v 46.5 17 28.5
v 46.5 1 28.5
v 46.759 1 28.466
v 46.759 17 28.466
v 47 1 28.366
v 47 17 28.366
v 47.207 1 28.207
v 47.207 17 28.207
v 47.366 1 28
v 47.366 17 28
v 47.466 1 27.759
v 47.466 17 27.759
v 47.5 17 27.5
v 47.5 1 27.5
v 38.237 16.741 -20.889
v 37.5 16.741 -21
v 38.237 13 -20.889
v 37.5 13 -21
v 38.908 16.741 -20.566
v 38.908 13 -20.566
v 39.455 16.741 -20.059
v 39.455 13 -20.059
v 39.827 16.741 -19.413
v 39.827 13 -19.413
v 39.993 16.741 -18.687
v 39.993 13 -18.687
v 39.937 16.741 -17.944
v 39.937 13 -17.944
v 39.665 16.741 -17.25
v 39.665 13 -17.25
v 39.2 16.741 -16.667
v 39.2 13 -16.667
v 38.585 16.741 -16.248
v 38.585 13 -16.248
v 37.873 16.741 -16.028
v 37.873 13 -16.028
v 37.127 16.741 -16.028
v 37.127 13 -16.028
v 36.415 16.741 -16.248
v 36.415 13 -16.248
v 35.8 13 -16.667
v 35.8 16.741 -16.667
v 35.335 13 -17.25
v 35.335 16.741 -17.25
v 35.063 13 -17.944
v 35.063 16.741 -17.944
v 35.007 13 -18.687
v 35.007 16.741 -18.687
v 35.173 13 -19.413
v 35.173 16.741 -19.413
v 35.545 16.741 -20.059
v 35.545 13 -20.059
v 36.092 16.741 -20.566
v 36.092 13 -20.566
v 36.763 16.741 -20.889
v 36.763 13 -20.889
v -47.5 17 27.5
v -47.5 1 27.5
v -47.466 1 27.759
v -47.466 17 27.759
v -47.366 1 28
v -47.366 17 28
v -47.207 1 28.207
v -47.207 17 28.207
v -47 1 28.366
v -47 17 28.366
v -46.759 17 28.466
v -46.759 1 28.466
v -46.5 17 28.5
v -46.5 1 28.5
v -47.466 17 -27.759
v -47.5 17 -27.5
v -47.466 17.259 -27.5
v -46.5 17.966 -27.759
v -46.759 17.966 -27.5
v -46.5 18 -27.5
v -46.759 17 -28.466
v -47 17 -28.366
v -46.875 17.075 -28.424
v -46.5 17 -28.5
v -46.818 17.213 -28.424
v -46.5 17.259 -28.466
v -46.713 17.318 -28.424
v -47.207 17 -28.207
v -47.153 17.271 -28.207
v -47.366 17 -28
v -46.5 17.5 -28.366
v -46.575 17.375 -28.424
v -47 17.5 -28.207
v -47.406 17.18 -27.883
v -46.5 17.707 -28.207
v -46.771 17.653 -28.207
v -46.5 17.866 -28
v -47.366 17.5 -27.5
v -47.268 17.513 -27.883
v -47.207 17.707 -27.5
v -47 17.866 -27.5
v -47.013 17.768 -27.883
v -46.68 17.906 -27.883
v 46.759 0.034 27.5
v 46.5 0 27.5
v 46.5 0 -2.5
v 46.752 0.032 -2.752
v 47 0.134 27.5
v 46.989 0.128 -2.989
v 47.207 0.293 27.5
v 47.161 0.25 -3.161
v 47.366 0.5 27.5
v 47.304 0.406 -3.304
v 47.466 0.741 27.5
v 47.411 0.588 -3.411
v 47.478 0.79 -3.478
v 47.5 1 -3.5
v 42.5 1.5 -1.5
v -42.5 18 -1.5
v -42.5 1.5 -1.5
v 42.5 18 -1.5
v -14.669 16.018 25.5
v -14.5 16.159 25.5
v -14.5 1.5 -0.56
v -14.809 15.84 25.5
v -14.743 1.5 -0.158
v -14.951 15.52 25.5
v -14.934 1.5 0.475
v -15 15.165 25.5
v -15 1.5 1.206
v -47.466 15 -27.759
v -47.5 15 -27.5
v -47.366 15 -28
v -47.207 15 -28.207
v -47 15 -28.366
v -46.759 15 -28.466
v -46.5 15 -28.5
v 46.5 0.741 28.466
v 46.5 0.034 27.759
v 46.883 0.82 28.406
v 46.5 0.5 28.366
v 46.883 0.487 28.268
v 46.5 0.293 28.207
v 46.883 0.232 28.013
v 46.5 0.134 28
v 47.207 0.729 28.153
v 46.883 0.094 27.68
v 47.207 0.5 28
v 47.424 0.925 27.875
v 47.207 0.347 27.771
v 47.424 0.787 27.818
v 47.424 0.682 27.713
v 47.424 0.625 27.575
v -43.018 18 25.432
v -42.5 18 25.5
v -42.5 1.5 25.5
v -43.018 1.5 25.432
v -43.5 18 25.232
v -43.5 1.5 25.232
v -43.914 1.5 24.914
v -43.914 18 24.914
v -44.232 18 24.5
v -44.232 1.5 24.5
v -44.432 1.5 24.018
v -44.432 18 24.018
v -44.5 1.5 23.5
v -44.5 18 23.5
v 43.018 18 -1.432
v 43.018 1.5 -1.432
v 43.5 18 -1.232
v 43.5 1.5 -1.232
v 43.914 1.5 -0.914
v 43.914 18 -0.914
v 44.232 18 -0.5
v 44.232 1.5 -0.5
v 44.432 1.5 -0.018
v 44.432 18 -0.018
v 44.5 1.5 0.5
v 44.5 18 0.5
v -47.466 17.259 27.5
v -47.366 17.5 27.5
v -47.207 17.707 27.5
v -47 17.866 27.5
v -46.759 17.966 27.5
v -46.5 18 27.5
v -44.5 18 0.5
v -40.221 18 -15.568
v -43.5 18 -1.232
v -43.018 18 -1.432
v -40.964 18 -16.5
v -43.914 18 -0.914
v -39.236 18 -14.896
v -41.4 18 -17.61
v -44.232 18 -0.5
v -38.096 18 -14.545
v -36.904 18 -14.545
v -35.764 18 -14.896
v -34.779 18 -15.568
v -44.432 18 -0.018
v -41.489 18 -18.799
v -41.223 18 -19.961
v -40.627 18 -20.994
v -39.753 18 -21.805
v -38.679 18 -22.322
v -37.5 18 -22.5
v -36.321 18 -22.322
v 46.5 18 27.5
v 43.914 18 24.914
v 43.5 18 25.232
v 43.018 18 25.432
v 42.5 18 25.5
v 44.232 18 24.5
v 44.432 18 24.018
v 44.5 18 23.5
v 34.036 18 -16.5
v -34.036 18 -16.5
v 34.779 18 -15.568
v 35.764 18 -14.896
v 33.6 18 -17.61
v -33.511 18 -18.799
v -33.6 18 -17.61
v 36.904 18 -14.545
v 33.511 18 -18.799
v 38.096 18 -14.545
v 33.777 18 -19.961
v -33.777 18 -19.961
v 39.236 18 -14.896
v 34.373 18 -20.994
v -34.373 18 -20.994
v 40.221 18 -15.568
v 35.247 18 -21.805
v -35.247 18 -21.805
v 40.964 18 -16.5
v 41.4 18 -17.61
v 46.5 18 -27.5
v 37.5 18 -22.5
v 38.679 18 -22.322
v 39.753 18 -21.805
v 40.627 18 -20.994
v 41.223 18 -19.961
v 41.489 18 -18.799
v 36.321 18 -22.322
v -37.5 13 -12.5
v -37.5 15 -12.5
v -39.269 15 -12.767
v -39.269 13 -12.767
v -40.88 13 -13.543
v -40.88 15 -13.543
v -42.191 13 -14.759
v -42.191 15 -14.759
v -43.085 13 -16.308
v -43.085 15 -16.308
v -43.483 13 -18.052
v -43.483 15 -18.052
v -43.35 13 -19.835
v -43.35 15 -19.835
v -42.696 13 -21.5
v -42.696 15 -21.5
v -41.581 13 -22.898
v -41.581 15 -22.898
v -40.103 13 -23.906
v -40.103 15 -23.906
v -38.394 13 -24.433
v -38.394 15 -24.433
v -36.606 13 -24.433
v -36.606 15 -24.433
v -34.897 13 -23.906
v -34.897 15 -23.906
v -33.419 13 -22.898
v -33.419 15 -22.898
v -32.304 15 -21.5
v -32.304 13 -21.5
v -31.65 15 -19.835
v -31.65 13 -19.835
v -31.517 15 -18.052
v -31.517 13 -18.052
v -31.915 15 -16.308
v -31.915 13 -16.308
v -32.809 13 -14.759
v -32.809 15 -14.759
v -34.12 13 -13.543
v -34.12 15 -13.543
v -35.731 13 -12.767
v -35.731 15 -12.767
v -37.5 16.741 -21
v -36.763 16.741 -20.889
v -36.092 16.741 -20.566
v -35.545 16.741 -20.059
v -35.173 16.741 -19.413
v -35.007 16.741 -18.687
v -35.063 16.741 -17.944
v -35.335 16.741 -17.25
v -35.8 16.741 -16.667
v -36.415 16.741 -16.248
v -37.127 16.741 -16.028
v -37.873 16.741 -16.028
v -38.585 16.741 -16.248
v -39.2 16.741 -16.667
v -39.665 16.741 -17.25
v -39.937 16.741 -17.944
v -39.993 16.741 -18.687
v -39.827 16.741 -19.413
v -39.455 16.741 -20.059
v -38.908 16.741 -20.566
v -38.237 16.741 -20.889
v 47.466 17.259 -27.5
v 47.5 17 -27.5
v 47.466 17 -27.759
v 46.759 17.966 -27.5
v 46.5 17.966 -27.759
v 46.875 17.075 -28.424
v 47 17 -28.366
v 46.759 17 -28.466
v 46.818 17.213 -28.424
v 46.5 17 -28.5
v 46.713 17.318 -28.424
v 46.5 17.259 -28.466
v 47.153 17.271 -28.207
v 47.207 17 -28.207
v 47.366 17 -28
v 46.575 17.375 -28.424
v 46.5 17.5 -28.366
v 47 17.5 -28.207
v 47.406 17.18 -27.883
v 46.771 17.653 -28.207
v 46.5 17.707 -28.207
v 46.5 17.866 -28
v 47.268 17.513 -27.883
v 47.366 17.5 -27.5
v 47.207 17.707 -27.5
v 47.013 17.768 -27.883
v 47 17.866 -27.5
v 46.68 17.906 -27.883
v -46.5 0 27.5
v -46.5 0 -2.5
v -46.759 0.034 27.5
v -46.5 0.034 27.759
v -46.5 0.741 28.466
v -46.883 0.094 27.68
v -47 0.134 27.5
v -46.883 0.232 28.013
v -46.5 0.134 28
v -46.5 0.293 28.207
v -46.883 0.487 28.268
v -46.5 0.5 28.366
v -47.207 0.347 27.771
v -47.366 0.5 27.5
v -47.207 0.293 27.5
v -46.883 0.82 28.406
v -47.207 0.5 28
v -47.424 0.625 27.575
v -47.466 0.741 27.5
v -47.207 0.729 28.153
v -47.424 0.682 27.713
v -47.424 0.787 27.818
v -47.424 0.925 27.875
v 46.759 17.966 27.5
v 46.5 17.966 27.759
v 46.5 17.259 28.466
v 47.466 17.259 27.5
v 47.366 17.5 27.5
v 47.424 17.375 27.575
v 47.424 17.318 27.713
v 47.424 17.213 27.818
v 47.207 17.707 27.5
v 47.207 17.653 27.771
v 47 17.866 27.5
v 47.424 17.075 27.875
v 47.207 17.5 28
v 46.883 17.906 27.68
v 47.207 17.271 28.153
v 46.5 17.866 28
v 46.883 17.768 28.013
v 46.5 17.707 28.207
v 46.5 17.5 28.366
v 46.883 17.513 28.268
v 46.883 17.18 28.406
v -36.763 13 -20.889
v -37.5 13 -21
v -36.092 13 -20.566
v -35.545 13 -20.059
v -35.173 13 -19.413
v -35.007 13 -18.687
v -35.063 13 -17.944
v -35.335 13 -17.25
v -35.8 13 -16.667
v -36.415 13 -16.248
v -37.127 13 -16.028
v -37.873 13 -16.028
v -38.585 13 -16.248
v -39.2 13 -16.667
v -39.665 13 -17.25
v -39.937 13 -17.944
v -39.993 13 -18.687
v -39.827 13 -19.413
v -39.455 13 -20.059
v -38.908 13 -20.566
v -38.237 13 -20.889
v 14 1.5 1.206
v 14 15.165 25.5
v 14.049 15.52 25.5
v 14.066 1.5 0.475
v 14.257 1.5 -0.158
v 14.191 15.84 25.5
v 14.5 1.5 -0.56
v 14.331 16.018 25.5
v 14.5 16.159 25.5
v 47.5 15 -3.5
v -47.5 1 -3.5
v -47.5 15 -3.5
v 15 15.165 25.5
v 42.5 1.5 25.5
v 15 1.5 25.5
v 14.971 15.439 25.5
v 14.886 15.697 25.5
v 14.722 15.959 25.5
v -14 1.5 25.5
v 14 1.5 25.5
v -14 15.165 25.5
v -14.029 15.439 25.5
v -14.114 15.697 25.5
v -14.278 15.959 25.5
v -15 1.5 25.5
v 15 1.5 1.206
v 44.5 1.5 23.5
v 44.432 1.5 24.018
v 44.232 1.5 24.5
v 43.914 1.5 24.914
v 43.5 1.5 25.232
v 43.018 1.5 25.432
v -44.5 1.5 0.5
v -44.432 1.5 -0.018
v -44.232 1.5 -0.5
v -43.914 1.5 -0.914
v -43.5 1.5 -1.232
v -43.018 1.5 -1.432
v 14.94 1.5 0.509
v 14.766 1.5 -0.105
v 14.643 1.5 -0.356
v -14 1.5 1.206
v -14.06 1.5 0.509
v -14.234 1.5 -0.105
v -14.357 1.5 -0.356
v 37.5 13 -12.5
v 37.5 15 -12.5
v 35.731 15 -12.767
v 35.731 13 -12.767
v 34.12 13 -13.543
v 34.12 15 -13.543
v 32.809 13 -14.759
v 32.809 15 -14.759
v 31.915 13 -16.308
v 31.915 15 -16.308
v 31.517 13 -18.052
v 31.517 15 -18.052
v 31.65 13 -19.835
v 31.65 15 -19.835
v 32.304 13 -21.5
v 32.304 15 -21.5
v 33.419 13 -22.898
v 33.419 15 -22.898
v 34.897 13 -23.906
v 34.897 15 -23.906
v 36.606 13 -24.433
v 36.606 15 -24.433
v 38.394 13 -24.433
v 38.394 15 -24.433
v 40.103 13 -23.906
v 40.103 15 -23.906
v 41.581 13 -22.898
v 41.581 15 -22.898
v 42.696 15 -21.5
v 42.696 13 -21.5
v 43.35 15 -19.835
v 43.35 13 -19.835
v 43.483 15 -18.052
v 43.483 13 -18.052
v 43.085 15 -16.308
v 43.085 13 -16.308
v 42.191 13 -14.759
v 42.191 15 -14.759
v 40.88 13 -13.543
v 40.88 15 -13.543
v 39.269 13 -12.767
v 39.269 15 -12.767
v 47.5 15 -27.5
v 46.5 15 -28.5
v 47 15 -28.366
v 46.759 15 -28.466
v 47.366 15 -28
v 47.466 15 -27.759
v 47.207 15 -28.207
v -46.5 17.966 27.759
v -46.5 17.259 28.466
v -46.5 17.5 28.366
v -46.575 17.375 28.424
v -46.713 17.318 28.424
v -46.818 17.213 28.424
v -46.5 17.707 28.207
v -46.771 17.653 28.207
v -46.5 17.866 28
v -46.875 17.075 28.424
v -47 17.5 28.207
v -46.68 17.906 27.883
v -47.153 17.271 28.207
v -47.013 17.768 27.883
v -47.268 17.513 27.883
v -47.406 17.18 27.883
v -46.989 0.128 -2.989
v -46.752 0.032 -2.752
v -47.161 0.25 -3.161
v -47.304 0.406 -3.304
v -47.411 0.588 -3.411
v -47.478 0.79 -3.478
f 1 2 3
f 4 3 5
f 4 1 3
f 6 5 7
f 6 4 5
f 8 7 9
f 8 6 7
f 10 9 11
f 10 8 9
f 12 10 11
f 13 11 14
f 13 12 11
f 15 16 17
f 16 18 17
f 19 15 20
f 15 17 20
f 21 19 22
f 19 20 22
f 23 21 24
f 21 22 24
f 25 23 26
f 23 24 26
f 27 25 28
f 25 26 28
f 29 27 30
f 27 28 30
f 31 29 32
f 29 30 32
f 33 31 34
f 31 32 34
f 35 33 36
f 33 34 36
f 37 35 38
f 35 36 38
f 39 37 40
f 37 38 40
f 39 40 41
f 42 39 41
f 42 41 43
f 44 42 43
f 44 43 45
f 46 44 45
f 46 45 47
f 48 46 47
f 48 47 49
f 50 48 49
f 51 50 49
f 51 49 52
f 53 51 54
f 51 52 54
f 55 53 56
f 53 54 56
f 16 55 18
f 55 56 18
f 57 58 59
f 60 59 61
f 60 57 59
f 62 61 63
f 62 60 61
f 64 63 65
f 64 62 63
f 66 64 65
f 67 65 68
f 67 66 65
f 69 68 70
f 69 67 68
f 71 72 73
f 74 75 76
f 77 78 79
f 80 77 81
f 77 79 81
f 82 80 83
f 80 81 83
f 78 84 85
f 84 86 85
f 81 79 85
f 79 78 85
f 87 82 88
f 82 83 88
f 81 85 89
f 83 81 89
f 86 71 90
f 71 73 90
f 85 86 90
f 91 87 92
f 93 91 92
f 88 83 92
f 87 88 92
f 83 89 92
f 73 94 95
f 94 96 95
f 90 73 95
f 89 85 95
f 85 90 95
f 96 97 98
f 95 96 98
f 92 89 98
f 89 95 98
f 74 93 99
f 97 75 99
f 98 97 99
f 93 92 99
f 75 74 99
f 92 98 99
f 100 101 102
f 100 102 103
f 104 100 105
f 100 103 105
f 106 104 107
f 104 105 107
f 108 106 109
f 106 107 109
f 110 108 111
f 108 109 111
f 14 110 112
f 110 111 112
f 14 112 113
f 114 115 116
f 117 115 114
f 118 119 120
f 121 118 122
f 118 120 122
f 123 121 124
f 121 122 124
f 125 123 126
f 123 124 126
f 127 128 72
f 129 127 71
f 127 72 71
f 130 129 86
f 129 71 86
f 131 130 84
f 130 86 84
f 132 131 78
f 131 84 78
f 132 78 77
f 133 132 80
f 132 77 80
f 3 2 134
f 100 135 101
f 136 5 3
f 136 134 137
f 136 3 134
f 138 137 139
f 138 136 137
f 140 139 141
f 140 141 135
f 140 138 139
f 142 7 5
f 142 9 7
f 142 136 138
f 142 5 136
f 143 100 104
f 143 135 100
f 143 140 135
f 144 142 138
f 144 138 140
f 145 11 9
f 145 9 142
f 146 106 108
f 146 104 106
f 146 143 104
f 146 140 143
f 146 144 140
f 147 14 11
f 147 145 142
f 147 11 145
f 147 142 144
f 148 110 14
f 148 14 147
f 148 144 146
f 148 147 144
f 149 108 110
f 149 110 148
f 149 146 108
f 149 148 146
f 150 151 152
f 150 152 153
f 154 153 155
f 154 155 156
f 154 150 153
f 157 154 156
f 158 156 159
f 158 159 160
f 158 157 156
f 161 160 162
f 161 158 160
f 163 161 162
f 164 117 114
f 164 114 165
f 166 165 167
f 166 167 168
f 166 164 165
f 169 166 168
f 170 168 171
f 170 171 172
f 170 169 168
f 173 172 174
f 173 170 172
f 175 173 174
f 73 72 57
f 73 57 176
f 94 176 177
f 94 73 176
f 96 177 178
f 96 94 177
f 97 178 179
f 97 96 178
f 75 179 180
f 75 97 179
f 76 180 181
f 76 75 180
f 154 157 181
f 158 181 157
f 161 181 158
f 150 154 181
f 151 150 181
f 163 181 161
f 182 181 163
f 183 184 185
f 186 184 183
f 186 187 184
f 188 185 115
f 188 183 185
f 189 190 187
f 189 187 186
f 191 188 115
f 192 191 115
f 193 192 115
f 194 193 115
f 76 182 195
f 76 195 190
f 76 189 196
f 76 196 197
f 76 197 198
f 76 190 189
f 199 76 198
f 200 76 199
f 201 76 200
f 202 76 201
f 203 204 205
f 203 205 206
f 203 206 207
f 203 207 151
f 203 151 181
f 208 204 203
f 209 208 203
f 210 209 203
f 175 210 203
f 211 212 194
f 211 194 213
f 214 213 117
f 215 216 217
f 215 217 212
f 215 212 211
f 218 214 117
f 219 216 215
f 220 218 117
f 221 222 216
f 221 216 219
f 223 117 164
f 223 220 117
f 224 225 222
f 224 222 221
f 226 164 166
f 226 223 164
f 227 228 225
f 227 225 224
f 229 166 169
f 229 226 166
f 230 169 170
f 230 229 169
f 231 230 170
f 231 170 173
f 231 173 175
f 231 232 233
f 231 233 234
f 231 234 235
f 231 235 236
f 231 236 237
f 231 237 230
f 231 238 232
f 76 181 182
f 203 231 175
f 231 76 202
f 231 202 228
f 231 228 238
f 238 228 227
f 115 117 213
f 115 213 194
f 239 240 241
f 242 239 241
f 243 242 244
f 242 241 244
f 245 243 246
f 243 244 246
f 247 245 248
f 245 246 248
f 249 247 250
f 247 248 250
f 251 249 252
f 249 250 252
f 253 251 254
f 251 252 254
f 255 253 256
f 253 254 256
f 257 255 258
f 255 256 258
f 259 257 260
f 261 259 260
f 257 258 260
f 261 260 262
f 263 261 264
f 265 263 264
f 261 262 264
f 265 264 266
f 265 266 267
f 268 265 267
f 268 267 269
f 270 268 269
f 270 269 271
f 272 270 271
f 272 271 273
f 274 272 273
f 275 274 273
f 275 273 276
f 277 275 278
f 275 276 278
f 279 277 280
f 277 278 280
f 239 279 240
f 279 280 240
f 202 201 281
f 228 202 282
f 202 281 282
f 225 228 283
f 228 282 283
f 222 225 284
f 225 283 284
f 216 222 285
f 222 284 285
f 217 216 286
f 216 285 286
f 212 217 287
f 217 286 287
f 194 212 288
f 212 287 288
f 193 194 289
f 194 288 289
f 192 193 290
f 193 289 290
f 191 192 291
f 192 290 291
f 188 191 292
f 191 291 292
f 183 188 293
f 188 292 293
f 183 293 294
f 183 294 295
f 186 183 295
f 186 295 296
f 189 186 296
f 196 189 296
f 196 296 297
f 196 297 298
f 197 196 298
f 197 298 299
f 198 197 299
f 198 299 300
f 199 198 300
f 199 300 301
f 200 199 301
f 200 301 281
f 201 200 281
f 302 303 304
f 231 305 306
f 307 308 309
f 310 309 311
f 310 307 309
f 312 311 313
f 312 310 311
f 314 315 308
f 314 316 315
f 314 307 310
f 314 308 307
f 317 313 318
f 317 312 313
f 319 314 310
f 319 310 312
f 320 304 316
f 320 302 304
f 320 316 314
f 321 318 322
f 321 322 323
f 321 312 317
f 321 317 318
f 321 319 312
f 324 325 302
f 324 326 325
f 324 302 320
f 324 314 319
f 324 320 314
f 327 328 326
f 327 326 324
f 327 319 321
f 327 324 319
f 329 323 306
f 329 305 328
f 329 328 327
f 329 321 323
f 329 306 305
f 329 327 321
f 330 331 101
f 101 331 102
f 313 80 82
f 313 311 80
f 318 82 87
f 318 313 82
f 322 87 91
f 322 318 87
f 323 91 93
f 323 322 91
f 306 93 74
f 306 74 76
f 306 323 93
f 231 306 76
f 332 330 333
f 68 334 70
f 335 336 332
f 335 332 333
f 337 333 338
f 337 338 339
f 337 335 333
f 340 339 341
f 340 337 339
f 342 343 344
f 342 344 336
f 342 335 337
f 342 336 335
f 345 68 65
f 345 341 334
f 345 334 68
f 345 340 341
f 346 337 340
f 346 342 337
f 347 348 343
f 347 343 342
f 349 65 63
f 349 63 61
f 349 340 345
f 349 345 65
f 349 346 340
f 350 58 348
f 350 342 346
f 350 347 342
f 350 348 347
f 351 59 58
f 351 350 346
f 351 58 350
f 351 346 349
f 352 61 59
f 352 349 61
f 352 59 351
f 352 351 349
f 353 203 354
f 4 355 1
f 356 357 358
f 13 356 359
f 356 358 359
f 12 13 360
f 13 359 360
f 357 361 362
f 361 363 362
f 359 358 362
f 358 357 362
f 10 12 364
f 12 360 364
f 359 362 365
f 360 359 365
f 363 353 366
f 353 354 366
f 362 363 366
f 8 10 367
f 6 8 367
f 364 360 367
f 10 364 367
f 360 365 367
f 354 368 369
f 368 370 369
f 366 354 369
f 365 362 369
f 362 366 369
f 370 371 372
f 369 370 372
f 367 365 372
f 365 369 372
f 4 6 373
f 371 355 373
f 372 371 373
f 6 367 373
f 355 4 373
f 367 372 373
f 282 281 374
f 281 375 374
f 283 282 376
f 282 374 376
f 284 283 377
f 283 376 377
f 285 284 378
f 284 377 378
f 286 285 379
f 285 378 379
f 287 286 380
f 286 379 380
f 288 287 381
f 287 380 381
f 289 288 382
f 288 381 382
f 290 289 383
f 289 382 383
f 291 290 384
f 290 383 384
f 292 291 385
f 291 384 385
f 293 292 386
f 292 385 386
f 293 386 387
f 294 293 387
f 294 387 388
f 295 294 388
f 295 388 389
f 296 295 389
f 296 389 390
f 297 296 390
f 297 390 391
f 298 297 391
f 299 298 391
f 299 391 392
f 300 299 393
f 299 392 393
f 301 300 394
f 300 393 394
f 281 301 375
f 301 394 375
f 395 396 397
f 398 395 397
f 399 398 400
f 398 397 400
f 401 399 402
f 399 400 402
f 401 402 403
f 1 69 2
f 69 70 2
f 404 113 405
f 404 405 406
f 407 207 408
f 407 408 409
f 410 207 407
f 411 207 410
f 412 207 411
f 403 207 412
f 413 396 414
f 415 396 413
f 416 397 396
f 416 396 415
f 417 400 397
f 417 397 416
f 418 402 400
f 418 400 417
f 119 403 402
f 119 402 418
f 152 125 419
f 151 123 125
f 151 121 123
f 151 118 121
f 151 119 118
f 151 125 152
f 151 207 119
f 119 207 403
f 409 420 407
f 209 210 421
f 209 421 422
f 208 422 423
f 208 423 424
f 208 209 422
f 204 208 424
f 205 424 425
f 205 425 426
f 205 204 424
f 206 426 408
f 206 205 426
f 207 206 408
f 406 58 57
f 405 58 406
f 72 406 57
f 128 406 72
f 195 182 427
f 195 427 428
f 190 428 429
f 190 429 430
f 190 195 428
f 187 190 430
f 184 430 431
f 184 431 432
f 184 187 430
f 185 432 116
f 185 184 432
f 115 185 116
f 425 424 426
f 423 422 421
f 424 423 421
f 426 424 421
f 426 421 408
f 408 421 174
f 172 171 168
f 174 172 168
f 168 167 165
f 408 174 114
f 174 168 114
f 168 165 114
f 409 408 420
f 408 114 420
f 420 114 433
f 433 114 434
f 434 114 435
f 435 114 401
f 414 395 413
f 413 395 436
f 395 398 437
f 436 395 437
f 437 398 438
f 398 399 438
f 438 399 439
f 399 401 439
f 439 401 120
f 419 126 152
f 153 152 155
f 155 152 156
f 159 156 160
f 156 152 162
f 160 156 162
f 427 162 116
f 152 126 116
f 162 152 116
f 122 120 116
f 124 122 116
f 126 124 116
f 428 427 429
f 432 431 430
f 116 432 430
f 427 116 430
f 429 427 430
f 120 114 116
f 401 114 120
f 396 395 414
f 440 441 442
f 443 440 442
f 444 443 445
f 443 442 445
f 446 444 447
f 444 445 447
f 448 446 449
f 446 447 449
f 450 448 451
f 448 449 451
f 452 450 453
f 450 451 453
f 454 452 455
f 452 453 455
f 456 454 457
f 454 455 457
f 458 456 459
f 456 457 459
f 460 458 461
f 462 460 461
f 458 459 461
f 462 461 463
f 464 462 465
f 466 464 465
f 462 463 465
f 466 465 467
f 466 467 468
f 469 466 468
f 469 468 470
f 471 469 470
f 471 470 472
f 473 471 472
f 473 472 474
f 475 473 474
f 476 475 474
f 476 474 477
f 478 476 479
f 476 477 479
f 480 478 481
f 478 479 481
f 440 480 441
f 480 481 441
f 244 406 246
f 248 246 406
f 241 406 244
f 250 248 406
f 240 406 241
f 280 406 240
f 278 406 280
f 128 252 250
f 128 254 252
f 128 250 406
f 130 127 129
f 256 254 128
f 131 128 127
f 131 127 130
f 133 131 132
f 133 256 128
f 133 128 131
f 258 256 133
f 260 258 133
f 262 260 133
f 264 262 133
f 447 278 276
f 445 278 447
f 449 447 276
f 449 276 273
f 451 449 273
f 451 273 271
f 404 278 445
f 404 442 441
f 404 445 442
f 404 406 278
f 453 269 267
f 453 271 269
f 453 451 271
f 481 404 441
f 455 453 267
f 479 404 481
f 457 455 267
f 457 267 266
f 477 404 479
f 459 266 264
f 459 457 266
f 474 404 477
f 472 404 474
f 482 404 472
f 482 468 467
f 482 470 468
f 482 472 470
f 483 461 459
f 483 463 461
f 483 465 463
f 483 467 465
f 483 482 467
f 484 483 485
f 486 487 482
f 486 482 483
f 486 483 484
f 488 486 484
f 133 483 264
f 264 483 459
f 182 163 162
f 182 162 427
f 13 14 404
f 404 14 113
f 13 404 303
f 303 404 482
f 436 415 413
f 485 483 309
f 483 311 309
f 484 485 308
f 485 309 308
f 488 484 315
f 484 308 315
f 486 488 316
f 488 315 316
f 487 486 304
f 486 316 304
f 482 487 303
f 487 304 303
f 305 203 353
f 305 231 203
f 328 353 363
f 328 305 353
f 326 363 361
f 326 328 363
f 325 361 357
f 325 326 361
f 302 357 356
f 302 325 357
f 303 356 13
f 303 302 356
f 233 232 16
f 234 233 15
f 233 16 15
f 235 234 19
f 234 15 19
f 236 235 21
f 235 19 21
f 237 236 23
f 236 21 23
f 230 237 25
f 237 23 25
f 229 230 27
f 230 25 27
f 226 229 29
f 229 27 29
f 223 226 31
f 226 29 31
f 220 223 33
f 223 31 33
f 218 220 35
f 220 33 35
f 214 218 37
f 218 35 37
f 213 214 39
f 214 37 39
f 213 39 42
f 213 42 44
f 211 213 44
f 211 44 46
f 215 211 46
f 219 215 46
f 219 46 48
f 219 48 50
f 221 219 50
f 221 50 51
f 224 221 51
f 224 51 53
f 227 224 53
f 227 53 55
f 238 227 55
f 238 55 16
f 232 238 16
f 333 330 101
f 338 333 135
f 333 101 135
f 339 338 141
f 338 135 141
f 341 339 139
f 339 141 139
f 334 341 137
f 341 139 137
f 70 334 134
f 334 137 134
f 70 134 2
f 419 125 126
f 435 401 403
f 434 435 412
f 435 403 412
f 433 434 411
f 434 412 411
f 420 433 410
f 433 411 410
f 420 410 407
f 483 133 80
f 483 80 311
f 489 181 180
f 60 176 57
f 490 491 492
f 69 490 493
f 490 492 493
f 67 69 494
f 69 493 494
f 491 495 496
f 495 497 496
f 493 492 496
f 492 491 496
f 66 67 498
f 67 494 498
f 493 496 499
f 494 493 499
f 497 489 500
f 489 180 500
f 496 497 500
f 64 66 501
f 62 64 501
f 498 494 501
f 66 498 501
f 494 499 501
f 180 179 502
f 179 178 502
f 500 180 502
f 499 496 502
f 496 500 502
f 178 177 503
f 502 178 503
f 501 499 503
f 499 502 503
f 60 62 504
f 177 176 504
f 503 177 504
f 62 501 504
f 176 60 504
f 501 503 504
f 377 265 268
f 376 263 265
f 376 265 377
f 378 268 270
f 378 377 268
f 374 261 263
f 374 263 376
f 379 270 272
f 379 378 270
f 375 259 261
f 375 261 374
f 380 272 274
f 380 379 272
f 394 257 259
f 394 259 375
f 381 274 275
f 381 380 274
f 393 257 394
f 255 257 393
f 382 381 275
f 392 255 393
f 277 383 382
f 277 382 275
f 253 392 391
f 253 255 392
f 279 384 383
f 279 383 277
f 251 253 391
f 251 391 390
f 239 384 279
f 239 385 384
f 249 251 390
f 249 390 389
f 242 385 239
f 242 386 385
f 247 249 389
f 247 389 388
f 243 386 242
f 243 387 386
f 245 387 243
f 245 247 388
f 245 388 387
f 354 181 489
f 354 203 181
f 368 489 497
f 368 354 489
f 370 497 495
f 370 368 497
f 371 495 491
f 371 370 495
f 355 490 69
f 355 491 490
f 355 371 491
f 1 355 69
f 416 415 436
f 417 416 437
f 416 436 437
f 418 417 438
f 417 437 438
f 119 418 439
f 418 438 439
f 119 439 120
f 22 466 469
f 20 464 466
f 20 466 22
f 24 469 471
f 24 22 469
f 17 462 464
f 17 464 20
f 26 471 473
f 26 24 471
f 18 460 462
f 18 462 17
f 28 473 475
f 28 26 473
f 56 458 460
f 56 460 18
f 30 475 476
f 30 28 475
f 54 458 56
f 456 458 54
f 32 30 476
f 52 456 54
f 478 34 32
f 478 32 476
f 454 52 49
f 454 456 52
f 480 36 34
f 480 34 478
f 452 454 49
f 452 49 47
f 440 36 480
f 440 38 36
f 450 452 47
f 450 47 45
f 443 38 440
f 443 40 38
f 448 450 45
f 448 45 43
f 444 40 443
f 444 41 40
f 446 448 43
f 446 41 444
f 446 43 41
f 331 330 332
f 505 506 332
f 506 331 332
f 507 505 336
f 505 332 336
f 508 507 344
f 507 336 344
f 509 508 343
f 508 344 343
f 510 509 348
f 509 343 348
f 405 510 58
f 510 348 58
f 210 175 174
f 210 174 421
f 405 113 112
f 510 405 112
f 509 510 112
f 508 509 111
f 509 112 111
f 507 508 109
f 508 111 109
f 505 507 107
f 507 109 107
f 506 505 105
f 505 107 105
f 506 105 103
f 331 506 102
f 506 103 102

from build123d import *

# Parameters (mm, degrees)
SKETCH2_W                                         = 95
SKETCH2_H                                         = 57
BOSS_EXTRUDE1_DEPTH                               = 18
SKETCH3_W                                         = 25
SKETCH3_H                                         = 15
CUT_EXTRUDE1_DEPTH                                = 101.803025748
CUT_EXTRUDE2_DEPTH                                = 16.5
SKETCH14_R                                        = 6
BOSS_EXTRUDE3_DEPTH                               = 2
CSK_FOR_4_FLAT_HEAD_MACHINE_SCREW_100_D           = 5
CSK_FOR_4_FLAT_HEAD_MACHINE_SCREW_100_CSINK_D     = 8
CSK_FOR_4_FLAT_HEAD_MACHINE_SCREW_100_CSINK_ANGLE = 100
RIB3_START                                        = -0.5
RIB3_DEPTH                                        = 1
RIB11_START                                       = -0.5
RIB11_DEPTH                                       = 1
FILLET1_R                                         = 1
FILLET2_R                                         = 1
FILLET3_R                                         = 1


# Read off the part's stored shape, not the designer's step: Rib3, Rib11
with BuildPart() as part:
    # Sketch2 → Boss-Extrude1 (new body)
    with BuildSketch(Plane(origin=(0, 0, 0), x_dir=(1, 0, 0), z_dir=(0, 1, 0))):
        Rectangle(SKETCH2_W, SKETCH2_H)
    extrude(amount=BOSS_EXTRUDE1_DEPTH)

    # Sketch3 → Cut-Extrude1 (cut, through all)
    with BuildSketch(Plane(origin=(47.5, 0, 0), x_dir=(0, 0, -1), z_dir=(1, 0, 0))):
        with Locations((16, 7.5)):
            Rectangle(SKETCH3_W, SKETCH3_H)
    extrude(amount=-CUT_EXTRUDE1_DEPTH, mode=Mode.SUBTRACT)

    # Sketch4 → Cut-Extrude2 (cut)
    with BuildSketch(Plane(origin=(0, 18, 0), x_dir=(1, 0, 0), z_dir=(0, 1, 0))):
        with BuildLine():
            Line((-42.5, 1.5), (42.5, 1.5))
            ThreePointArc((42.5, 1.5), (43.914213562, 0.914213562), (44.5, -0.5))
            Line((44.5, -0.5), (44.5, -23.5))
            ThreePointArc((44.5, -23.5), (43.914213562, -24.914213562), (42.5, -25.5))
            Line((42.5, -25.5), (-42.5, -25.5))
            ThreePointArc((-42.5, -25.5), (-43.914213562, -24.914213562), (-44.5, -23.5))
            Line((-44.5, -23.5), (-44.5, -0.5))
            ThreePointArc((-44.5, -0.5), (-43.914213562, 0.914213562), (-42.5, 1.5))
        make_face()
    extrude(amount=-CUT_EXTRUDE2_DEPTH, mode=Mode.SUBTRACT)

    # Sketch14 → Boss-Extrude3 (add)
    with BuildSketch(Plane(origin=(0, 15, 0), x_dir=(-1, 0, 0), z_dir=(0, -1, 0))):
        with Locations(Location((37.5, 18.5, 0), (0, 0, 270))):
            Circle(SKETCH14_R)
        with Locations(Location((-37.5, 18.5, 0), (0, 0, 270))):
            Circle(SKETCH14_R)
    extrude(amount=BOSS_EXTRUDE3_DEPTH)

    # CSK for #4 Flat Head Machine Screw (100)3 (through all)
    with Locations(Plane(origin=(37.5, 18, -18.5), x_dir=(0, 0, 1), z_dir=(0, 1, 0))):
        with Locations((0, 0), (0, -75)):
            CounterSinkHole(CSK_FOR_4_FLAT_HEAD_MACHINE_SCREW_100_D / 2, CSK_FOR_4_FLAT_HEAD_MACHINE_SCREW_100_CSINK_D / 2, counter_sink_angle=CSK_FOR_4_FLAT_HEAD_MACHINE_SCREW_100_CSINK_ANGLE)

    # Rib3 outline → Rib3 (add)
    with BuildSketch(Plane.ZY.offset(-14.5).offset(RIB3_START)):
        Polygon((25.5, 16.3125), (-0.833333333, 1.5), (25.5, 1.5), align=None)
    extrude(amount=RIB3_DEPTH)

    # Rib11 outline → Rib11 (add)
    with BuildSketch(Plane(origin=(-14.5, 0, 0), x_dir=(0, 0, -1), z_dir=(1, 0, 0)).offset(RIB11_START)):
        Polygon((0.833333333, 1.5), (-25.5, 16.3125), (-25.5, 1.5), align=None)
    extrude(amount=RIB11_DEPTH)

    # Fillet1
    # the kernel refuses this fillet: 1 mm, written as the material it takes off along each edge
    with BuildSketch(Plane(origin=(-15, 0.274346901, -3.012272176), x_dir=(0, -0.8715755371218976, 0.49026123963727325), z_dir=(0, 0.49026123963727325, 0.8715755371218976))) as fillet1_piece_1_section:
        with BuildLine():
            CenterArc((FILLET1_R, FILLET1_R), FILLET1_R, 180, 90)
            Line((0, FILLET1_R), (0, 0))
            Line((0, 0), (FILLET1_R, 0))
        make_face()
    fillet1_piece_1 = extrude(amount=35.213483756, mode=Mode.PRIVATE)
    fillet1_piece_1 = split(fillet1_piece_1, bisect_by=Plane(origin=(-14.771440182, 8.778475149, 25.5), z_dir=(0, 0, -1)), keep=Keep.TOP, mode=Mode.PRIVATE)
    fillet1_piece_1 = split(fillet1_piece_1, bisect_by=Plane(origin=(-14.771440182, 1.5, 12.560488623), z_dir=(0, 1, 0)), keep=Keep.TOP, mode=Mode.PRIVATE)
    add(fillet1_piece_1, mode=Mode.SUBTRACT)
    with BuildSketch(Plane(origin=(-14, 0.274346901, -3.012272176), x_dir=(-1, 0, 0), z_dir=(0, 0.49026123963727325, 0.8715755371218976))) as fillet1_piece_2_section:
        with BuildLine():
            CenterArc((FILLET1_R, FILLET1_R), FILLET1_R, 180, 90)
            Line((0, FILLET1_R), (0, 0))
            Line((0, 0), (FILLET1_R, 0))
        make_face()
    fillet1_piece_2 = extrude(amount=35.213483756, mode=Mode.PRIVATE)
    fillet1_piece_2 = split(fillet1_piece_2, bisect_by=Plane(origin=(-14.228559818, 8.778475149, 25.5), z_dir=(0, 0, -1)), keep=Keep.TOP, mode=Mode.PRIVATE)
    fillet1_piece_2 = split(fillet1_piece_2, bisect_by=Plane(origin=(-14.228559818, 1.5, 12.560488623), z_dir=(0, 1, 0)), keep=Keep.TOP, mode=Mode.PRIVATE)
    add(fillet1_piece_2, mode=Mode.SUBTRACT)
    with BuildSketch(Plane(origin=(14, 17.538153099, 27.678938843), x_dir=(0, -0.8715755371218977, 0.4902612396372733), z_dir=(0, -0.49026123963727325, -0.8715755371218976))) as fillet1_piece_3_section:
        with BuildLine():
            CenterArc((FILLET1_R, -FILLET1_R), FILLET1_R, 90, 90)
            Line((0, -FILLET1_R), (0, 0))
            Line((0, 0), (FILLET1_R, 0))
        make_face()
    fillet1_piece_3 = extrude(amount=35.213483756, mode=Mode.PRIVATE)
    fillet1_piece_3 = split(fillet1_piece_3, bisect_by=Plane(origin=(14.228559818, 8.778475149, 25.5), z_dir=(0, 0, -1)), keep=Keep.TOP, mode=Mode.PRIVATE)
    fillet1_piece_3 = split(fillet1_piece_3, bisect_by=Plane(origin=(14.228559818, 1.5, 12.560488623), z_dir=(0, 1, 0)), keep=Keep.TOP, mode=Mode.PRIVATE)
    add(fillet1_piece_3, mode=Mode.SUBTRACT)
    with BuildSketch(Plane(origin=(15, 17.538153099, 27.678938843), x_dir=(-1, 0, 0), z_dir=(0, -0.49026123963727325, -0.8715755371218976))) as fillet1_piece_4_section:
        with BuildLine():
            CenterArc((FILLET1_R, -FILLET1_R), FILLET1_R, 90, 90)
            Line((0, -FILLET1_R), (0, 0))
            Line((0, 0), (FILLET1_R, 0))
        make_face()
    fillet1_piece_4 = extrude(amount=35.213483756, mode=Mode.PRIVATE)
    fillet1_piece_4 = split(fillet1_piece_4, bisect_by=Plane(origin=(14.771440182, 8.778475149, 25.5), z_dir=(0, 0, -1)), keep=Keep.TOP, mode=Mode.PRIVATE)
    fillet1_piece_4 = split(fillet1_piece_4, bisect_by=Plane(origin=(14.771440182, 1.5, 12.560488623), z_dir=(0, 1, 0)), keep=Keep.TOP, mode=Mode.PRIVATE)
    add(fillet1_piece_4, mode=Mode.SUBTRACT)

    # Fillet2
    fillet2_edges = [part.edges().sort_by_distance(p)[0] for p in [
        (-47.5, 18, 0),
        (0, 18, 28.5),
        (47.5, 18, 0),
        (0, 0, 28.5),
        (47.5, 9, 28.5),
        (-47.5, 9, 28.5),
        (-47.5, 16.5, -28.5),
        (47.5, 16.5, -28.5),
        (0, 18, -28.5),
    ]]
    fillet(fillet2_edges, radius=FILLET2_R)

    # Fillet3
    # the kernel refuses this fillet: 1 mm, written as the material it takes off along each edge
    with BuildSketch(Plane(origin=(-46.5, 1, 27.5), x_dir=(0, -1, 0), z_dir=(-1, 0, 0))) as fillet3_piece_1_section:
        Polygon((0, 0), (FILLET3_R, 0), (FILLET3_R, FILLET3_R), (0, FILLET3_R), align=None)
    fillet3_piece_1 = extrude(amount=FILLET3_R, mode=Mode.PRIVATE)
    fillet3_piece_1 = fillet3_piece_1 - Plane(origin=(-46.5, 1, 27.5), x_dir=(0, 0.7071067811865475, -0.7071067811865475), z_dir=(-1, 0, 0)) * Sphere(FILLET3_R, mode=Mode.PRIVATE)
    add(fillet3_piece_1, mode=Mode.SUBTRACT)
    with BuildSketch(Plane(origin=(46.5, 1, 27.5), x_dir=(0, -1, 0), z_dir=(1, 0, 0))) as fillet3_piece_2_section:
        Polygon((0, 0), (FILLET3_R, 0), (FILLET3_R, -FILLET3_R), (0, -FILLET3_R), align=None)
    fillet3_piece_2 = extrude(amount=FILLET3_R, mode=Mode.PRIVATE)
    fillet3_piece_2 = fillet3_piece_2 - Plane(origin=(46.5, 1, 27.5), x_dir=(0, 0.7071067811865475, -0.7071067811865475), z_dir=(1, 0, 0)) * Sphere(FILLET3_R, mode=Mode.PRIVATE)
    add(fillet3_piece_2, mode=Mode.SUBTRACT)
    with BuildSketch(Plane(origin=(47.5, 0, -6), x_dir=(0, 1, 0), z_dir=(0, 0, 1)), Plane(origin=(-47.5, 0, 27.5), x_dir=(0, 1, 0), z_dir=(0, 0, -1))) as fillet3_piece_3:
        with BuildLine():
            CenterArc((FILLET3_R, FILLET3_R), FILLET3_R, 180, 90)
            Line((0, FILLET3_R), (0, 0))
            Line((0, 0), (FILLET3_R, 0))
        make_face()
    extrude(amount=33.5, mode=Mode.SUBTRACT)
    with BuildSketch(Plane(origin=(50, 0, -3.5), x_dir=(0, 1, 0), z_dir=(-1, 0, 0))) as fillet3_piece_4:
        with BuildLine():
            CenterArc((FILLET3_R, -FILLET3_R), FILLET3_R, 90, 90)
            Line((0, -FILLET3_R), (0, 0))
            Line((0, 0), (FILLET3_R, 0))
        make_face()
    extrude(amount=100, mode=Mode.SUBTRACT)


solid = part.part
